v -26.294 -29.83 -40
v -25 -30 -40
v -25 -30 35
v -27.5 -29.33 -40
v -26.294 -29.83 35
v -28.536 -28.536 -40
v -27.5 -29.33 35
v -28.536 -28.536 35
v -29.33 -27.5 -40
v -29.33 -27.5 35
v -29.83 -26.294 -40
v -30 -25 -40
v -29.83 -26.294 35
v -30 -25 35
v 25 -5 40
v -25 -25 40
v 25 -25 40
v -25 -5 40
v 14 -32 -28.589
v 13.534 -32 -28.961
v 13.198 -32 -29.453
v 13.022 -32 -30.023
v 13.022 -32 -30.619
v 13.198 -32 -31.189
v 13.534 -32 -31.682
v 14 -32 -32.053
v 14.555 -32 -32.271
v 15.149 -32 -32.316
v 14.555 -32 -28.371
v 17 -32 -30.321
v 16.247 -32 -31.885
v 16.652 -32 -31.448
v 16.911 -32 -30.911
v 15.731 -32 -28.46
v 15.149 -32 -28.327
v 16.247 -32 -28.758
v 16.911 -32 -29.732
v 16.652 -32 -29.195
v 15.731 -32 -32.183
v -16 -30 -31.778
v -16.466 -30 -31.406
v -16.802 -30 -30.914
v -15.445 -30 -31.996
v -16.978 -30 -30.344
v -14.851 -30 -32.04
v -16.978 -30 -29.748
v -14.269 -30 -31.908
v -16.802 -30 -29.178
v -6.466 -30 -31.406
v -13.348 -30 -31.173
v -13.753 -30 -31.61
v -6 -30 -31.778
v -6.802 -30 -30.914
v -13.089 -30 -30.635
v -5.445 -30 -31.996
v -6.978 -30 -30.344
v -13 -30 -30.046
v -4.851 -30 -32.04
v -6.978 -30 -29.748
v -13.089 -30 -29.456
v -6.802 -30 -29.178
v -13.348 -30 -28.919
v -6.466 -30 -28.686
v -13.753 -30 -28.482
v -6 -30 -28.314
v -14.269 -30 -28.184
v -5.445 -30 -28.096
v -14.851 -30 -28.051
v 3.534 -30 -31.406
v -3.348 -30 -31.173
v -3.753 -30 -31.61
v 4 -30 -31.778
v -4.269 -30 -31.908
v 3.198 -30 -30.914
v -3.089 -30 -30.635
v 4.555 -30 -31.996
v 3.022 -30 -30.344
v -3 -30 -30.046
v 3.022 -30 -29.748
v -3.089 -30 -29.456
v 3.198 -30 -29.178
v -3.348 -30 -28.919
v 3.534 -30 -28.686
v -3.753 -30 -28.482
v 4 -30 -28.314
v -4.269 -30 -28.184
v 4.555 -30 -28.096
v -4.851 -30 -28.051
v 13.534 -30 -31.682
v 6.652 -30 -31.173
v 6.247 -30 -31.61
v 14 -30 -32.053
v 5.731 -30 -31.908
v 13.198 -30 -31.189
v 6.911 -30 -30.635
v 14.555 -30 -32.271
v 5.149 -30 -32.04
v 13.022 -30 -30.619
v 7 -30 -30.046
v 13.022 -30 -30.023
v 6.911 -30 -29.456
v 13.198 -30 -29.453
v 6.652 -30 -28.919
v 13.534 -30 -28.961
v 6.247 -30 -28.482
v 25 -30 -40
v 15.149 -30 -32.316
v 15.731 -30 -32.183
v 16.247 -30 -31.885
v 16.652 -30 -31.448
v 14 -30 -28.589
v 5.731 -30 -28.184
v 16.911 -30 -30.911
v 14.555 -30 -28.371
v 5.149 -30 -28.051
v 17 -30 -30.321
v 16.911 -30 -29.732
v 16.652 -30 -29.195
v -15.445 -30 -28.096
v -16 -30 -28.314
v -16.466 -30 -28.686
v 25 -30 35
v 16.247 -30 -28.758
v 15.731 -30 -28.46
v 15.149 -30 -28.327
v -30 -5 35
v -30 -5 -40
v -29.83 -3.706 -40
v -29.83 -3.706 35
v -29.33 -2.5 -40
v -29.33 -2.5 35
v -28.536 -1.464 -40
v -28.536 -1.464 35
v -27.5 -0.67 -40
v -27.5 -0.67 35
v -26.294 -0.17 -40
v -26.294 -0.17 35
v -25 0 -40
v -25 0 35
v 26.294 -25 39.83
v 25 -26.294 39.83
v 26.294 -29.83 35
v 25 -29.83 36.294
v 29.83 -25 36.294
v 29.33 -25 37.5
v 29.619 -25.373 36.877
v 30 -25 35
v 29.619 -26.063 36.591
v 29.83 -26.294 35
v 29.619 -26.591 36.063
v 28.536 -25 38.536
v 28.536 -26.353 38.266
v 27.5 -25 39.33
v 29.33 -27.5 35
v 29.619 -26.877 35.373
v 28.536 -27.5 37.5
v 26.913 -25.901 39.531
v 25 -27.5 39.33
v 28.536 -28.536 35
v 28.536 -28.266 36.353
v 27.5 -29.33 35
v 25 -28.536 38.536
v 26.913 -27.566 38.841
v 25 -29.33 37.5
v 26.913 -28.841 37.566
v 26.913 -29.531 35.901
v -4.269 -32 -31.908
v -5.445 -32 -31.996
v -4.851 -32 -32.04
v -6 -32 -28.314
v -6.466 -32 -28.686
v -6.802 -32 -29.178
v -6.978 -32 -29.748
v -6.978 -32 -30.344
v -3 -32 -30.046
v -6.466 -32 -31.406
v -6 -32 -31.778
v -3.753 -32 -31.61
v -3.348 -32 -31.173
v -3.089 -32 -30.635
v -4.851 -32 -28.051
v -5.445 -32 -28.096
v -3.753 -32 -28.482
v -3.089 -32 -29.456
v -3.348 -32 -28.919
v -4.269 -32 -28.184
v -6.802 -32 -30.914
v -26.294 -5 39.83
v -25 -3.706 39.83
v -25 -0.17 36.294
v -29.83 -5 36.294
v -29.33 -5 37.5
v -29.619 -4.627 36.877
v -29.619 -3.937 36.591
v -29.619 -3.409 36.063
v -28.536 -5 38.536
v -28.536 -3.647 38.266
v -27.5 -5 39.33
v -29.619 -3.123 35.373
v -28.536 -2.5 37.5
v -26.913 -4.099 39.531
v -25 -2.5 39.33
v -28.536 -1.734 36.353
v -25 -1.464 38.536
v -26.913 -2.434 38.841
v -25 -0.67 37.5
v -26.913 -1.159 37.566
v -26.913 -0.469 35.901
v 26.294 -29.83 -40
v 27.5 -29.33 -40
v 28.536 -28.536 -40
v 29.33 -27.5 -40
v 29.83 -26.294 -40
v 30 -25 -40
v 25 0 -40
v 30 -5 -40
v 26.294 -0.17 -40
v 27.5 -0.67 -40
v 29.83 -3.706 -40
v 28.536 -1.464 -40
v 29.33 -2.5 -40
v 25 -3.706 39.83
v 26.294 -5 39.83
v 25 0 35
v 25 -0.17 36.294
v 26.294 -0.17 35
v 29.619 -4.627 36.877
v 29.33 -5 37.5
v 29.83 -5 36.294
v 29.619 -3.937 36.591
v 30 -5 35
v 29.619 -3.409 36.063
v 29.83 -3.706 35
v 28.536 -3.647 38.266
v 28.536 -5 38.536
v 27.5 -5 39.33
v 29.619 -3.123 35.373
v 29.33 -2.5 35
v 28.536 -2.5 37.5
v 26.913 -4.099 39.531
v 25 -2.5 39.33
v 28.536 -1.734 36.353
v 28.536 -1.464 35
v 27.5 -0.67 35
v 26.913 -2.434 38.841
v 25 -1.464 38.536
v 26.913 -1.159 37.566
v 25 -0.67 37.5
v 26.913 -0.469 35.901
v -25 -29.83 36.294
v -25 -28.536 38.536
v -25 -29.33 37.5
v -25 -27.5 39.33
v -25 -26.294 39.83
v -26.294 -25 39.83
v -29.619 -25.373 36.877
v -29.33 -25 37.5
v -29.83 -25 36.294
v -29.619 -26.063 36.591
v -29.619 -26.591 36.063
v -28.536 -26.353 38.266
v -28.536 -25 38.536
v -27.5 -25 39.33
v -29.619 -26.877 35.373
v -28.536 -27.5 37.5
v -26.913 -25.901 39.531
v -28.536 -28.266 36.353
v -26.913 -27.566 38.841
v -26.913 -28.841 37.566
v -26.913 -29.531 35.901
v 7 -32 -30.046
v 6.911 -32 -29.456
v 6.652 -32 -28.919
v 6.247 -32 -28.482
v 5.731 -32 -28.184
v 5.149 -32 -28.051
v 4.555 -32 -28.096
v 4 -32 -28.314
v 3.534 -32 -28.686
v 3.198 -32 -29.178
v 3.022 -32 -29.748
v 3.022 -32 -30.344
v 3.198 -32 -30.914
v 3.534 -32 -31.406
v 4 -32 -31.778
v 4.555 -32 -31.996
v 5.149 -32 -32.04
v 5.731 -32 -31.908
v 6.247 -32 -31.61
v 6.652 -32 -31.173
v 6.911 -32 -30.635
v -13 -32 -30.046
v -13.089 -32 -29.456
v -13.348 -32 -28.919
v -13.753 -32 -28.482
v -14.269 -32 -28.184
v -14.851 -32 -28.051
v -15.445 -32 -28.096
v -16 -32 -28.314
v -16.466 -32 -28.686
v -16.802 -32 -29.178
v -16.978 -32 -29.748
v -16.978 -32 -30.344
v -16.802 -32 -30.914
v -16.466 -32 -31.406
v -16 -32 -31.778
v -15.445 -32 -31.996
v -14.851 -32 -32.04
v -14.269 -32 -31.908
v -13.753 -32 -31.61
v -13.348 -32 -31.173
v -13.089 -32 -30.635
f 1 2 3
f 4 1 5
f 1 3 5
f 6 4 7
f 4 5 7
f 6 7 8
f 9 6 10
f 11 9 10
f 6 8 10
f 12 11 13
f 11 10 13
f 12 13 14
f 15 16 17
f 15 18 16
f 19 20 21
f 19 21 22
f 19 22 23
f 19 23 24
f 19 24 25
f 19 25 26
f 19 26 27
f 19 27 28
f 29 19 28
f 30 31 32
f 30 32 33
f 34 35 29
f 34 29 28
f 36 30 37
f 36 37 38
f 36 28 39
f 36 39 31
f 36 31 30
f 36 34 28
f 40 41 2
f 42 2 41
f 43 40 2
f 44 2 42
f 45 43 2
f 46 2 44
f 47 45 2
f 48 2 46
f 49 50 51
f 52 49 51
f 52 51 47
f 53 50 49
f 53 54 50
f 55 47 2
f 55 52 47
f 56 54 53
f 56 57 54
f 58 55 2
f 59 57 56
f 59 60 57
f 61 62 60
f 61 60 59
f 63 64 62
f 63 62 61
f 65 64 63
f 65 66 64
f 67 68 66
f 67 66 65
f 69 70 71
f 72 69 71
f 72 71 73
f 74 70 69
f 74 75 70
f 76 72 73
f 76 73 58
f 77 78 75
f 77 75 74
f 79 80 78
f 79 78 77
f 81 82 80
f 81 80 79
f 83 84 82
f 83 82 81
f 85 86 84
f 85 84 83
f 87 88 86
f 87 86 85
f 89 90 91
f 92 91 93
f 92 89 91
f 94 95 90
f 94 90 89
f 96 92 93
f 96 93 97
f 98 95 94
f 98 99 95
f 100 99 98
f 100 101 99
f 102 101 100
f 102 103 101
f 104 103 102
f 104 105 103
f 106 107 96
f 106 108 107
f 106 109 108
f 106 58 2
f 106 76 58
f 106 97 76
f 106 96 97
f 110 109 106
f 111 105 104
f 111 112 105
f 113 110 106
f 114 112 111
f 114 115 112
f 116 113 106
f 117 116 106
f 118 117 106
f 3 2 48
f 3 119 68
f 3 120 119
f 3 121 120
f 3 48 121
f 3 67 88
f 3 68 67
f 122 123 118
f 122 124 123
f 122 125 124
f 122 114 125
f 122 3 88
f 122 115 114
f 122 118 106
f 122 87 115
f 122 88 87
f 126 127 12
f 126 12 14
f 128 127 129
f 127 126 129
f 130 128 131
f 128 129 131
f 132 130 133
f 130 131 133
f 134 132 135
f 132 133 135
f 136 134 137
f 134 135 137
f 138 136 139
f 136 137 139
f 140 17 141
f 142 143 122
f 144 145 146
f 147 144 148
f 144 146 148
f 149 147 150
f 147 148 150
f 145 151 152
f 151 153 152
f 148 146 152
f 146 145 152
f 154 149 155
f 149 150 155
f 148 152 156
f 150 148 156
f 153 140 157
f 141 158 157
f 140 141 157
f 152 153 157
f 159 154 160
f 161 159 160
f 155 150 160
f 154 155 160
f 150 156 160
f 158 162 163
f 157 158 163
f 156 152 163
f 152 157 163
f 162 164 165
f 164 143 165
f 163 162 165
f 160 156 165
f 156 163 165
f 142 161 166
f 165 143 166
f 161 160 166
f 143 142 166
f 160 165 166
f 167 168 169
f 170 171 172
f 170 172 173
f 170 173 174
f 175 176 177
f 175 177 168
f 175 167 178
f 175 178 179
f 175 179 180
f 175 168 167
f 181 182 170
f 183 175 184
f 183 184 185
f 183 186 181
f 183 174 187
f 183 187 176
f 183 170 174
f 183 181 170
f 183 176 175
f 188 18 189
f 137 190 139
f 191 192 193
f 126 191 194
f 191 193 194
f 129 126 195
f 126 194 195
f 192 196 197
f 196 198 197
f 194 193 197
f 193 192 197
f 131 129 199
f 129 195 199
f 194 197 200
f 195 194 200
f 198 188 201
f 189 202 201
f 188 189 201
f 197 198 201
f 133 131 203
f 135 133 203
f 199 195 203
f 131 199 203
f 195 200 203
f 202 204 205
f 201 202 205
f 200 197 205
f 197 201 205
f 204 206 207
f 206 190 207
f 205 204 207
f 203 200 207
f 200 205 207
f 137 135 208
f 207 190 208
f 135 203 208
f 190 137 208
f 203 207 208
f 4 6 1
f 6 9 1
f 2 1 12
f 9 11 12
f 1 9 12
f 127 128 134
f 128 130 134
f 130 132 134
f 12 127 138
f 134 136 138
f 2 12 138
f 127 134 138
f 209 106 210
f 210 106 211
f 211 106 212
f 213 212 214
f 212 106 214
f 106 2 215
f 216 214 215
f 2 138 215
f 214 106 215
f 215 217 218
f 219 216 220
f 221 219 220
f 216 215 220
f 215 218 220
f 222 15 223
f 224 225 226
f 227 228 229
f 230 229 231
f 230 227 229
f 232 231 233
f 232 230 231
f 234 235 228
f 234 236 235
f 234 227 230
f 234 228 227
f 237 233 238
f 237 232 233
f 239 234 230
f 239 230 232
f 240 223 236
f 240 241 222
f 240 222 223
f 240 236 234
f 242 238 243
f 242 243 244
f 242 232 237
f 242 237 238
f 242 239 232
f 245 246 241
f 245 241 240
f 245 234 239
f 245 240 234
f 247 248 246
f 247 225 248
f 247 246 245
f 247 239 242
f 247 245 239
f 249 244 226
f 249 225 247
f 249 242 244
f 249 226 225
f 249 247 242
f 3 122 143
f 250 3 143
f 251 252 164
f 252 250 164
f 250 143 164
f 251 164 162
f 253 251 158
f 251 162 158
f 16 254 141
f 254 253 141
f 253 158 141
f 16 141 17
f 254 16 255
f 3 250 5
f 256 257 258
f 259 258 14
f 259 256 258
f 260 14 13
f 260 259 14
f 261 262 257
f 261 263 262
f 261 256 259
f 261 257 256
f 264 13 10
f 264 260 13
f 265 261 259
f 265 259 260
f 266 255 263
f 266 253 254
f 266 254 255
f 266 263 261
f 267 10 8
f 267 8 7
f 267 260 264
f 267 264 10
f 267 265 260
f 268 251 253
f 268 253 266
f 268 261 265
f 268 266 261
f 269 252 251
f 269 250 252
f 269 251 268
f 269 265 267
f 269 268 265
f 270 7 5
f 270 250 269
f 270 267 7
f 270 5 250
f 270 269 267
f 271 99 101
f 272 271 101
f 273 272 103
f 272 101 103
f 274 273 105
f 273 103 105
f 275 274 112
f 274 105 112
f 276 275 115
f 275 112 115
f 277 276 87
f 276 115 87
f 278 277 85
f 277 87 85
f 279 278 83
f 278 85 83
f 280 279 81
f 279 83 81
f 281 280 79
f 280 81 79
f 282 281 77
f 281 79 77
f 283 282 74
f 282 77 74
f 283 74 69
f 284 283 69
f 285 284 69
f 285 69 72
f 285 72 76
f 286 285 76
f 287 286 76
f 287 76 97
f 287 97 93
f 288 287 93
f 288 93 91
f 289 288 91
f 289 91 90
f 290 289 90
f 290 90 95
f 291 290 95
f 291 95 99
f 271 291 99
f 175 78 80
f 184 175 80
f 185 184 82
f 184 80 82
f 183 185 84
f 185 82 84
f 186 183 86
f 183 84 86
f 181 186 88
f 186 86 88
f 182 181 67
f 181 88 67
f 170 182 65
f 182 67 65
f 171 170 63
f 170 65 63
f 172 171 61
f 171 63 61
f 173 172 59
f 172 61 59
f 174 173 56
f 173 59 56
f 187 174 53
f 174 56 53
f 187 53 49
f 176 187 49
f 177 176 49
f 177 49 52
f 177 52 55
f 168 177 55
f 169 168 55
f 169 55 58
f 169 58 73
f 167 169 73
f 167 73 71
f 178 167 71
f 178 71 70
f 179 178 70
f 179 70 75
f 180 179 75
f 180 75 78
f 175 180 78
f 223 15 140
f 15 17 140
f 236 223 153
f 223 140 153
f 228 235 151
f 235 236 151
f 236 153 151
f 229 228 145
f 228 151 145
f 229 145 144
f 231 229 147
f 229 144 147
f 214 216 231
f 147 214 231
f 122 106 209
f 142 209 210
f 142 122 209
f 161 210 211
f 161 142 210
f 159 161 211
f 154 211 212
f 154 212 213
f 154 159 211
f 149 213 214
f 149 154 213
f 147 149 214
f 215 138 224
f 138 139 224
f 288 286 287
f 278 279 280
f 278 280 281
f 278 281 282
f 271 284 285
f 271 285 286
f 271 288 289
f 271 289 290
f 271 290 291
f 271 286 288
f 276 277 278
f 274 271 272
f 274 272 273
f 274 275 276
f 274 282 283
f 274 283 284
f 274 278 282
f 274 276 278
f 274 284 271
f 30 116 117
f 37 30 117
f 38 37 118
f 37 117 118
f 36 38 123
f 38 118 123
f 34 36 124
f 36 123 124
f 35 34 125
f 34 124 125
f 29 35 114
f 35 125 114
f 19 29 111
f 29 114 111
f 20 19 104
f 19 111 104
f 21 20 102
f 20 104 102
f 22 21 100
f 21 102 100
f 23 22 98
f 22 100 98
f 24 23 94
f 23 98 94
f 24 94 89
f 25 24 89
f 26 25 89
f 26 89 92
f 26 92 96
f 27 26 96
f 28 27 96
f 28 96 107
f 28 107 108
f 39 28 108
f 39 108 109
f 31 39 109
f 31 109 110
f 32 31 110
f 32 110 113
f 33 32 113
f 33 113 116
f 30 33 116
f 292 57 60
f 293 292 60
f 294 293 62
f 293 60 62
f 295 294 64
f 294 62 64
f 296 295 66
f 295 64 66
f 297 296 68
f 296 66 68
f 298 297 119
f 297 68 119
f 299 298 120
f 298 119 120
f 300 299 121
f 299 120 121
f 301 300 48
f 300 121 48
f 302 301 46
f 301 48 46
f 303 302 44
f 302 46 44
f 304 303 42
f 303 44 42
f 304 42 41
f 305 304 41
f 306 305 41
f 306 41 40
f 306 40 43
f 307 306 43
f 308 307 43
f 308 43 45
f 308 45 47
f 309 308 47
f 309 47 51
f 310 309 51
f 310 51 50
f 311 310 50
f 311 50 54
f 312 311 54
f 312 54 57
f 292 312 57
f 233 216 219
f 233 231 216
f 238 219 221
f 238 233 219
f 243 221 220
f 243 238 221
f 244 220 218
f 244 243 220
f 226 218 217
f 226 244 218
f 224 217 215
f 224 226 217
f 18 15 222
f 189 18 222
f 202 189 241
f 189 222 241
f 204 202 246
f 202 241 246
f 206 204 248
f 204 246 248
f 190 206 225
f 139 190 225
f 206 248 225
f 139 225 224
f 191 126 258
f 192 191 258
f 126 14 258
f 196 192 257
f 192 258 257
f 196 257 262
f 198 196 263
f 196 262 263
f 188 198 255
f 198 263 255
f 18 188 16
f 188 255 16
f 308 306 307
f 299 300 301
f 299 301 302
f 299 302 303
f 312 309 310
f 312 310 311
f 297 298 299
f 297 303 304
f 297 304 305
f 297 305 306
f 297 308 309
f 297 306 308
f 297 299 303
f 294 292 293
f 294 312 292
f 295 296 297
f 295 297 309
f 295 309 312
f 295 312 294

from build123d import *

# Parameters (mm, degrees)
F0_W     = 60
F0_H     = 80
F0_R     = 2
F1_DEPTH = 30
F2_DEPTH = 32
F3_R     = 5


# Not quite as in the source:
# - a feature names something its author has since deleted; it is built from what else it names


with BuildPart() as f1:
    # F0 (on Front) → F1 (new body)
    with BuildSketch(Plane.XZ):
        Rectangle(F0_W, F0_H)
        with Locations((-15, -30.0458669662)):
            Circle(F0_R, mode=Mode.SUBTRACT)
        with Locations((-5, -30.0458669662)):
            Circle(F0_R, mode=Mode.SUBTRACT)
        with Locations((5, -30.0458669662)):
            Circle(F0_R, mode=Mode.SUBTRACT)
        with Locations((15, -30.3212571889)):
            Circle(F0_R, mode=Mode.SUBTRACT)
    extrude(amount=F1_DEPTH)

    # F0 (on Front) → F2 (join)
    with BuildSketch(Plane.XZ):
        with Locations((-15, -30.0458669662)):
            Circle(F0_R)
        with Locations((15, -30.3212571889)):
            Circle(F0_R)
        with Locations((-5, -30.0458669662)):
            Circle(F0_R)
        with Locations((5, -30.0458669662)):
            Circle(F0_R)
    extrude(amount=F2_DEPTH)

    # F3
    f3_edges = [f1.edges().sort_by_distance(p)[0] for p in [
        (0, -30, 40),
        (0, 0, 40),
        (30, -15, 40),
        (-30, -15, 40),
        (-30, -30, 0),
        (30, -30, 0),
        (-30, 0, 0),
        (30, 0, 0),
    ]]
    fillet(f3_edges, radius=F3_R)


solid = f1.part
